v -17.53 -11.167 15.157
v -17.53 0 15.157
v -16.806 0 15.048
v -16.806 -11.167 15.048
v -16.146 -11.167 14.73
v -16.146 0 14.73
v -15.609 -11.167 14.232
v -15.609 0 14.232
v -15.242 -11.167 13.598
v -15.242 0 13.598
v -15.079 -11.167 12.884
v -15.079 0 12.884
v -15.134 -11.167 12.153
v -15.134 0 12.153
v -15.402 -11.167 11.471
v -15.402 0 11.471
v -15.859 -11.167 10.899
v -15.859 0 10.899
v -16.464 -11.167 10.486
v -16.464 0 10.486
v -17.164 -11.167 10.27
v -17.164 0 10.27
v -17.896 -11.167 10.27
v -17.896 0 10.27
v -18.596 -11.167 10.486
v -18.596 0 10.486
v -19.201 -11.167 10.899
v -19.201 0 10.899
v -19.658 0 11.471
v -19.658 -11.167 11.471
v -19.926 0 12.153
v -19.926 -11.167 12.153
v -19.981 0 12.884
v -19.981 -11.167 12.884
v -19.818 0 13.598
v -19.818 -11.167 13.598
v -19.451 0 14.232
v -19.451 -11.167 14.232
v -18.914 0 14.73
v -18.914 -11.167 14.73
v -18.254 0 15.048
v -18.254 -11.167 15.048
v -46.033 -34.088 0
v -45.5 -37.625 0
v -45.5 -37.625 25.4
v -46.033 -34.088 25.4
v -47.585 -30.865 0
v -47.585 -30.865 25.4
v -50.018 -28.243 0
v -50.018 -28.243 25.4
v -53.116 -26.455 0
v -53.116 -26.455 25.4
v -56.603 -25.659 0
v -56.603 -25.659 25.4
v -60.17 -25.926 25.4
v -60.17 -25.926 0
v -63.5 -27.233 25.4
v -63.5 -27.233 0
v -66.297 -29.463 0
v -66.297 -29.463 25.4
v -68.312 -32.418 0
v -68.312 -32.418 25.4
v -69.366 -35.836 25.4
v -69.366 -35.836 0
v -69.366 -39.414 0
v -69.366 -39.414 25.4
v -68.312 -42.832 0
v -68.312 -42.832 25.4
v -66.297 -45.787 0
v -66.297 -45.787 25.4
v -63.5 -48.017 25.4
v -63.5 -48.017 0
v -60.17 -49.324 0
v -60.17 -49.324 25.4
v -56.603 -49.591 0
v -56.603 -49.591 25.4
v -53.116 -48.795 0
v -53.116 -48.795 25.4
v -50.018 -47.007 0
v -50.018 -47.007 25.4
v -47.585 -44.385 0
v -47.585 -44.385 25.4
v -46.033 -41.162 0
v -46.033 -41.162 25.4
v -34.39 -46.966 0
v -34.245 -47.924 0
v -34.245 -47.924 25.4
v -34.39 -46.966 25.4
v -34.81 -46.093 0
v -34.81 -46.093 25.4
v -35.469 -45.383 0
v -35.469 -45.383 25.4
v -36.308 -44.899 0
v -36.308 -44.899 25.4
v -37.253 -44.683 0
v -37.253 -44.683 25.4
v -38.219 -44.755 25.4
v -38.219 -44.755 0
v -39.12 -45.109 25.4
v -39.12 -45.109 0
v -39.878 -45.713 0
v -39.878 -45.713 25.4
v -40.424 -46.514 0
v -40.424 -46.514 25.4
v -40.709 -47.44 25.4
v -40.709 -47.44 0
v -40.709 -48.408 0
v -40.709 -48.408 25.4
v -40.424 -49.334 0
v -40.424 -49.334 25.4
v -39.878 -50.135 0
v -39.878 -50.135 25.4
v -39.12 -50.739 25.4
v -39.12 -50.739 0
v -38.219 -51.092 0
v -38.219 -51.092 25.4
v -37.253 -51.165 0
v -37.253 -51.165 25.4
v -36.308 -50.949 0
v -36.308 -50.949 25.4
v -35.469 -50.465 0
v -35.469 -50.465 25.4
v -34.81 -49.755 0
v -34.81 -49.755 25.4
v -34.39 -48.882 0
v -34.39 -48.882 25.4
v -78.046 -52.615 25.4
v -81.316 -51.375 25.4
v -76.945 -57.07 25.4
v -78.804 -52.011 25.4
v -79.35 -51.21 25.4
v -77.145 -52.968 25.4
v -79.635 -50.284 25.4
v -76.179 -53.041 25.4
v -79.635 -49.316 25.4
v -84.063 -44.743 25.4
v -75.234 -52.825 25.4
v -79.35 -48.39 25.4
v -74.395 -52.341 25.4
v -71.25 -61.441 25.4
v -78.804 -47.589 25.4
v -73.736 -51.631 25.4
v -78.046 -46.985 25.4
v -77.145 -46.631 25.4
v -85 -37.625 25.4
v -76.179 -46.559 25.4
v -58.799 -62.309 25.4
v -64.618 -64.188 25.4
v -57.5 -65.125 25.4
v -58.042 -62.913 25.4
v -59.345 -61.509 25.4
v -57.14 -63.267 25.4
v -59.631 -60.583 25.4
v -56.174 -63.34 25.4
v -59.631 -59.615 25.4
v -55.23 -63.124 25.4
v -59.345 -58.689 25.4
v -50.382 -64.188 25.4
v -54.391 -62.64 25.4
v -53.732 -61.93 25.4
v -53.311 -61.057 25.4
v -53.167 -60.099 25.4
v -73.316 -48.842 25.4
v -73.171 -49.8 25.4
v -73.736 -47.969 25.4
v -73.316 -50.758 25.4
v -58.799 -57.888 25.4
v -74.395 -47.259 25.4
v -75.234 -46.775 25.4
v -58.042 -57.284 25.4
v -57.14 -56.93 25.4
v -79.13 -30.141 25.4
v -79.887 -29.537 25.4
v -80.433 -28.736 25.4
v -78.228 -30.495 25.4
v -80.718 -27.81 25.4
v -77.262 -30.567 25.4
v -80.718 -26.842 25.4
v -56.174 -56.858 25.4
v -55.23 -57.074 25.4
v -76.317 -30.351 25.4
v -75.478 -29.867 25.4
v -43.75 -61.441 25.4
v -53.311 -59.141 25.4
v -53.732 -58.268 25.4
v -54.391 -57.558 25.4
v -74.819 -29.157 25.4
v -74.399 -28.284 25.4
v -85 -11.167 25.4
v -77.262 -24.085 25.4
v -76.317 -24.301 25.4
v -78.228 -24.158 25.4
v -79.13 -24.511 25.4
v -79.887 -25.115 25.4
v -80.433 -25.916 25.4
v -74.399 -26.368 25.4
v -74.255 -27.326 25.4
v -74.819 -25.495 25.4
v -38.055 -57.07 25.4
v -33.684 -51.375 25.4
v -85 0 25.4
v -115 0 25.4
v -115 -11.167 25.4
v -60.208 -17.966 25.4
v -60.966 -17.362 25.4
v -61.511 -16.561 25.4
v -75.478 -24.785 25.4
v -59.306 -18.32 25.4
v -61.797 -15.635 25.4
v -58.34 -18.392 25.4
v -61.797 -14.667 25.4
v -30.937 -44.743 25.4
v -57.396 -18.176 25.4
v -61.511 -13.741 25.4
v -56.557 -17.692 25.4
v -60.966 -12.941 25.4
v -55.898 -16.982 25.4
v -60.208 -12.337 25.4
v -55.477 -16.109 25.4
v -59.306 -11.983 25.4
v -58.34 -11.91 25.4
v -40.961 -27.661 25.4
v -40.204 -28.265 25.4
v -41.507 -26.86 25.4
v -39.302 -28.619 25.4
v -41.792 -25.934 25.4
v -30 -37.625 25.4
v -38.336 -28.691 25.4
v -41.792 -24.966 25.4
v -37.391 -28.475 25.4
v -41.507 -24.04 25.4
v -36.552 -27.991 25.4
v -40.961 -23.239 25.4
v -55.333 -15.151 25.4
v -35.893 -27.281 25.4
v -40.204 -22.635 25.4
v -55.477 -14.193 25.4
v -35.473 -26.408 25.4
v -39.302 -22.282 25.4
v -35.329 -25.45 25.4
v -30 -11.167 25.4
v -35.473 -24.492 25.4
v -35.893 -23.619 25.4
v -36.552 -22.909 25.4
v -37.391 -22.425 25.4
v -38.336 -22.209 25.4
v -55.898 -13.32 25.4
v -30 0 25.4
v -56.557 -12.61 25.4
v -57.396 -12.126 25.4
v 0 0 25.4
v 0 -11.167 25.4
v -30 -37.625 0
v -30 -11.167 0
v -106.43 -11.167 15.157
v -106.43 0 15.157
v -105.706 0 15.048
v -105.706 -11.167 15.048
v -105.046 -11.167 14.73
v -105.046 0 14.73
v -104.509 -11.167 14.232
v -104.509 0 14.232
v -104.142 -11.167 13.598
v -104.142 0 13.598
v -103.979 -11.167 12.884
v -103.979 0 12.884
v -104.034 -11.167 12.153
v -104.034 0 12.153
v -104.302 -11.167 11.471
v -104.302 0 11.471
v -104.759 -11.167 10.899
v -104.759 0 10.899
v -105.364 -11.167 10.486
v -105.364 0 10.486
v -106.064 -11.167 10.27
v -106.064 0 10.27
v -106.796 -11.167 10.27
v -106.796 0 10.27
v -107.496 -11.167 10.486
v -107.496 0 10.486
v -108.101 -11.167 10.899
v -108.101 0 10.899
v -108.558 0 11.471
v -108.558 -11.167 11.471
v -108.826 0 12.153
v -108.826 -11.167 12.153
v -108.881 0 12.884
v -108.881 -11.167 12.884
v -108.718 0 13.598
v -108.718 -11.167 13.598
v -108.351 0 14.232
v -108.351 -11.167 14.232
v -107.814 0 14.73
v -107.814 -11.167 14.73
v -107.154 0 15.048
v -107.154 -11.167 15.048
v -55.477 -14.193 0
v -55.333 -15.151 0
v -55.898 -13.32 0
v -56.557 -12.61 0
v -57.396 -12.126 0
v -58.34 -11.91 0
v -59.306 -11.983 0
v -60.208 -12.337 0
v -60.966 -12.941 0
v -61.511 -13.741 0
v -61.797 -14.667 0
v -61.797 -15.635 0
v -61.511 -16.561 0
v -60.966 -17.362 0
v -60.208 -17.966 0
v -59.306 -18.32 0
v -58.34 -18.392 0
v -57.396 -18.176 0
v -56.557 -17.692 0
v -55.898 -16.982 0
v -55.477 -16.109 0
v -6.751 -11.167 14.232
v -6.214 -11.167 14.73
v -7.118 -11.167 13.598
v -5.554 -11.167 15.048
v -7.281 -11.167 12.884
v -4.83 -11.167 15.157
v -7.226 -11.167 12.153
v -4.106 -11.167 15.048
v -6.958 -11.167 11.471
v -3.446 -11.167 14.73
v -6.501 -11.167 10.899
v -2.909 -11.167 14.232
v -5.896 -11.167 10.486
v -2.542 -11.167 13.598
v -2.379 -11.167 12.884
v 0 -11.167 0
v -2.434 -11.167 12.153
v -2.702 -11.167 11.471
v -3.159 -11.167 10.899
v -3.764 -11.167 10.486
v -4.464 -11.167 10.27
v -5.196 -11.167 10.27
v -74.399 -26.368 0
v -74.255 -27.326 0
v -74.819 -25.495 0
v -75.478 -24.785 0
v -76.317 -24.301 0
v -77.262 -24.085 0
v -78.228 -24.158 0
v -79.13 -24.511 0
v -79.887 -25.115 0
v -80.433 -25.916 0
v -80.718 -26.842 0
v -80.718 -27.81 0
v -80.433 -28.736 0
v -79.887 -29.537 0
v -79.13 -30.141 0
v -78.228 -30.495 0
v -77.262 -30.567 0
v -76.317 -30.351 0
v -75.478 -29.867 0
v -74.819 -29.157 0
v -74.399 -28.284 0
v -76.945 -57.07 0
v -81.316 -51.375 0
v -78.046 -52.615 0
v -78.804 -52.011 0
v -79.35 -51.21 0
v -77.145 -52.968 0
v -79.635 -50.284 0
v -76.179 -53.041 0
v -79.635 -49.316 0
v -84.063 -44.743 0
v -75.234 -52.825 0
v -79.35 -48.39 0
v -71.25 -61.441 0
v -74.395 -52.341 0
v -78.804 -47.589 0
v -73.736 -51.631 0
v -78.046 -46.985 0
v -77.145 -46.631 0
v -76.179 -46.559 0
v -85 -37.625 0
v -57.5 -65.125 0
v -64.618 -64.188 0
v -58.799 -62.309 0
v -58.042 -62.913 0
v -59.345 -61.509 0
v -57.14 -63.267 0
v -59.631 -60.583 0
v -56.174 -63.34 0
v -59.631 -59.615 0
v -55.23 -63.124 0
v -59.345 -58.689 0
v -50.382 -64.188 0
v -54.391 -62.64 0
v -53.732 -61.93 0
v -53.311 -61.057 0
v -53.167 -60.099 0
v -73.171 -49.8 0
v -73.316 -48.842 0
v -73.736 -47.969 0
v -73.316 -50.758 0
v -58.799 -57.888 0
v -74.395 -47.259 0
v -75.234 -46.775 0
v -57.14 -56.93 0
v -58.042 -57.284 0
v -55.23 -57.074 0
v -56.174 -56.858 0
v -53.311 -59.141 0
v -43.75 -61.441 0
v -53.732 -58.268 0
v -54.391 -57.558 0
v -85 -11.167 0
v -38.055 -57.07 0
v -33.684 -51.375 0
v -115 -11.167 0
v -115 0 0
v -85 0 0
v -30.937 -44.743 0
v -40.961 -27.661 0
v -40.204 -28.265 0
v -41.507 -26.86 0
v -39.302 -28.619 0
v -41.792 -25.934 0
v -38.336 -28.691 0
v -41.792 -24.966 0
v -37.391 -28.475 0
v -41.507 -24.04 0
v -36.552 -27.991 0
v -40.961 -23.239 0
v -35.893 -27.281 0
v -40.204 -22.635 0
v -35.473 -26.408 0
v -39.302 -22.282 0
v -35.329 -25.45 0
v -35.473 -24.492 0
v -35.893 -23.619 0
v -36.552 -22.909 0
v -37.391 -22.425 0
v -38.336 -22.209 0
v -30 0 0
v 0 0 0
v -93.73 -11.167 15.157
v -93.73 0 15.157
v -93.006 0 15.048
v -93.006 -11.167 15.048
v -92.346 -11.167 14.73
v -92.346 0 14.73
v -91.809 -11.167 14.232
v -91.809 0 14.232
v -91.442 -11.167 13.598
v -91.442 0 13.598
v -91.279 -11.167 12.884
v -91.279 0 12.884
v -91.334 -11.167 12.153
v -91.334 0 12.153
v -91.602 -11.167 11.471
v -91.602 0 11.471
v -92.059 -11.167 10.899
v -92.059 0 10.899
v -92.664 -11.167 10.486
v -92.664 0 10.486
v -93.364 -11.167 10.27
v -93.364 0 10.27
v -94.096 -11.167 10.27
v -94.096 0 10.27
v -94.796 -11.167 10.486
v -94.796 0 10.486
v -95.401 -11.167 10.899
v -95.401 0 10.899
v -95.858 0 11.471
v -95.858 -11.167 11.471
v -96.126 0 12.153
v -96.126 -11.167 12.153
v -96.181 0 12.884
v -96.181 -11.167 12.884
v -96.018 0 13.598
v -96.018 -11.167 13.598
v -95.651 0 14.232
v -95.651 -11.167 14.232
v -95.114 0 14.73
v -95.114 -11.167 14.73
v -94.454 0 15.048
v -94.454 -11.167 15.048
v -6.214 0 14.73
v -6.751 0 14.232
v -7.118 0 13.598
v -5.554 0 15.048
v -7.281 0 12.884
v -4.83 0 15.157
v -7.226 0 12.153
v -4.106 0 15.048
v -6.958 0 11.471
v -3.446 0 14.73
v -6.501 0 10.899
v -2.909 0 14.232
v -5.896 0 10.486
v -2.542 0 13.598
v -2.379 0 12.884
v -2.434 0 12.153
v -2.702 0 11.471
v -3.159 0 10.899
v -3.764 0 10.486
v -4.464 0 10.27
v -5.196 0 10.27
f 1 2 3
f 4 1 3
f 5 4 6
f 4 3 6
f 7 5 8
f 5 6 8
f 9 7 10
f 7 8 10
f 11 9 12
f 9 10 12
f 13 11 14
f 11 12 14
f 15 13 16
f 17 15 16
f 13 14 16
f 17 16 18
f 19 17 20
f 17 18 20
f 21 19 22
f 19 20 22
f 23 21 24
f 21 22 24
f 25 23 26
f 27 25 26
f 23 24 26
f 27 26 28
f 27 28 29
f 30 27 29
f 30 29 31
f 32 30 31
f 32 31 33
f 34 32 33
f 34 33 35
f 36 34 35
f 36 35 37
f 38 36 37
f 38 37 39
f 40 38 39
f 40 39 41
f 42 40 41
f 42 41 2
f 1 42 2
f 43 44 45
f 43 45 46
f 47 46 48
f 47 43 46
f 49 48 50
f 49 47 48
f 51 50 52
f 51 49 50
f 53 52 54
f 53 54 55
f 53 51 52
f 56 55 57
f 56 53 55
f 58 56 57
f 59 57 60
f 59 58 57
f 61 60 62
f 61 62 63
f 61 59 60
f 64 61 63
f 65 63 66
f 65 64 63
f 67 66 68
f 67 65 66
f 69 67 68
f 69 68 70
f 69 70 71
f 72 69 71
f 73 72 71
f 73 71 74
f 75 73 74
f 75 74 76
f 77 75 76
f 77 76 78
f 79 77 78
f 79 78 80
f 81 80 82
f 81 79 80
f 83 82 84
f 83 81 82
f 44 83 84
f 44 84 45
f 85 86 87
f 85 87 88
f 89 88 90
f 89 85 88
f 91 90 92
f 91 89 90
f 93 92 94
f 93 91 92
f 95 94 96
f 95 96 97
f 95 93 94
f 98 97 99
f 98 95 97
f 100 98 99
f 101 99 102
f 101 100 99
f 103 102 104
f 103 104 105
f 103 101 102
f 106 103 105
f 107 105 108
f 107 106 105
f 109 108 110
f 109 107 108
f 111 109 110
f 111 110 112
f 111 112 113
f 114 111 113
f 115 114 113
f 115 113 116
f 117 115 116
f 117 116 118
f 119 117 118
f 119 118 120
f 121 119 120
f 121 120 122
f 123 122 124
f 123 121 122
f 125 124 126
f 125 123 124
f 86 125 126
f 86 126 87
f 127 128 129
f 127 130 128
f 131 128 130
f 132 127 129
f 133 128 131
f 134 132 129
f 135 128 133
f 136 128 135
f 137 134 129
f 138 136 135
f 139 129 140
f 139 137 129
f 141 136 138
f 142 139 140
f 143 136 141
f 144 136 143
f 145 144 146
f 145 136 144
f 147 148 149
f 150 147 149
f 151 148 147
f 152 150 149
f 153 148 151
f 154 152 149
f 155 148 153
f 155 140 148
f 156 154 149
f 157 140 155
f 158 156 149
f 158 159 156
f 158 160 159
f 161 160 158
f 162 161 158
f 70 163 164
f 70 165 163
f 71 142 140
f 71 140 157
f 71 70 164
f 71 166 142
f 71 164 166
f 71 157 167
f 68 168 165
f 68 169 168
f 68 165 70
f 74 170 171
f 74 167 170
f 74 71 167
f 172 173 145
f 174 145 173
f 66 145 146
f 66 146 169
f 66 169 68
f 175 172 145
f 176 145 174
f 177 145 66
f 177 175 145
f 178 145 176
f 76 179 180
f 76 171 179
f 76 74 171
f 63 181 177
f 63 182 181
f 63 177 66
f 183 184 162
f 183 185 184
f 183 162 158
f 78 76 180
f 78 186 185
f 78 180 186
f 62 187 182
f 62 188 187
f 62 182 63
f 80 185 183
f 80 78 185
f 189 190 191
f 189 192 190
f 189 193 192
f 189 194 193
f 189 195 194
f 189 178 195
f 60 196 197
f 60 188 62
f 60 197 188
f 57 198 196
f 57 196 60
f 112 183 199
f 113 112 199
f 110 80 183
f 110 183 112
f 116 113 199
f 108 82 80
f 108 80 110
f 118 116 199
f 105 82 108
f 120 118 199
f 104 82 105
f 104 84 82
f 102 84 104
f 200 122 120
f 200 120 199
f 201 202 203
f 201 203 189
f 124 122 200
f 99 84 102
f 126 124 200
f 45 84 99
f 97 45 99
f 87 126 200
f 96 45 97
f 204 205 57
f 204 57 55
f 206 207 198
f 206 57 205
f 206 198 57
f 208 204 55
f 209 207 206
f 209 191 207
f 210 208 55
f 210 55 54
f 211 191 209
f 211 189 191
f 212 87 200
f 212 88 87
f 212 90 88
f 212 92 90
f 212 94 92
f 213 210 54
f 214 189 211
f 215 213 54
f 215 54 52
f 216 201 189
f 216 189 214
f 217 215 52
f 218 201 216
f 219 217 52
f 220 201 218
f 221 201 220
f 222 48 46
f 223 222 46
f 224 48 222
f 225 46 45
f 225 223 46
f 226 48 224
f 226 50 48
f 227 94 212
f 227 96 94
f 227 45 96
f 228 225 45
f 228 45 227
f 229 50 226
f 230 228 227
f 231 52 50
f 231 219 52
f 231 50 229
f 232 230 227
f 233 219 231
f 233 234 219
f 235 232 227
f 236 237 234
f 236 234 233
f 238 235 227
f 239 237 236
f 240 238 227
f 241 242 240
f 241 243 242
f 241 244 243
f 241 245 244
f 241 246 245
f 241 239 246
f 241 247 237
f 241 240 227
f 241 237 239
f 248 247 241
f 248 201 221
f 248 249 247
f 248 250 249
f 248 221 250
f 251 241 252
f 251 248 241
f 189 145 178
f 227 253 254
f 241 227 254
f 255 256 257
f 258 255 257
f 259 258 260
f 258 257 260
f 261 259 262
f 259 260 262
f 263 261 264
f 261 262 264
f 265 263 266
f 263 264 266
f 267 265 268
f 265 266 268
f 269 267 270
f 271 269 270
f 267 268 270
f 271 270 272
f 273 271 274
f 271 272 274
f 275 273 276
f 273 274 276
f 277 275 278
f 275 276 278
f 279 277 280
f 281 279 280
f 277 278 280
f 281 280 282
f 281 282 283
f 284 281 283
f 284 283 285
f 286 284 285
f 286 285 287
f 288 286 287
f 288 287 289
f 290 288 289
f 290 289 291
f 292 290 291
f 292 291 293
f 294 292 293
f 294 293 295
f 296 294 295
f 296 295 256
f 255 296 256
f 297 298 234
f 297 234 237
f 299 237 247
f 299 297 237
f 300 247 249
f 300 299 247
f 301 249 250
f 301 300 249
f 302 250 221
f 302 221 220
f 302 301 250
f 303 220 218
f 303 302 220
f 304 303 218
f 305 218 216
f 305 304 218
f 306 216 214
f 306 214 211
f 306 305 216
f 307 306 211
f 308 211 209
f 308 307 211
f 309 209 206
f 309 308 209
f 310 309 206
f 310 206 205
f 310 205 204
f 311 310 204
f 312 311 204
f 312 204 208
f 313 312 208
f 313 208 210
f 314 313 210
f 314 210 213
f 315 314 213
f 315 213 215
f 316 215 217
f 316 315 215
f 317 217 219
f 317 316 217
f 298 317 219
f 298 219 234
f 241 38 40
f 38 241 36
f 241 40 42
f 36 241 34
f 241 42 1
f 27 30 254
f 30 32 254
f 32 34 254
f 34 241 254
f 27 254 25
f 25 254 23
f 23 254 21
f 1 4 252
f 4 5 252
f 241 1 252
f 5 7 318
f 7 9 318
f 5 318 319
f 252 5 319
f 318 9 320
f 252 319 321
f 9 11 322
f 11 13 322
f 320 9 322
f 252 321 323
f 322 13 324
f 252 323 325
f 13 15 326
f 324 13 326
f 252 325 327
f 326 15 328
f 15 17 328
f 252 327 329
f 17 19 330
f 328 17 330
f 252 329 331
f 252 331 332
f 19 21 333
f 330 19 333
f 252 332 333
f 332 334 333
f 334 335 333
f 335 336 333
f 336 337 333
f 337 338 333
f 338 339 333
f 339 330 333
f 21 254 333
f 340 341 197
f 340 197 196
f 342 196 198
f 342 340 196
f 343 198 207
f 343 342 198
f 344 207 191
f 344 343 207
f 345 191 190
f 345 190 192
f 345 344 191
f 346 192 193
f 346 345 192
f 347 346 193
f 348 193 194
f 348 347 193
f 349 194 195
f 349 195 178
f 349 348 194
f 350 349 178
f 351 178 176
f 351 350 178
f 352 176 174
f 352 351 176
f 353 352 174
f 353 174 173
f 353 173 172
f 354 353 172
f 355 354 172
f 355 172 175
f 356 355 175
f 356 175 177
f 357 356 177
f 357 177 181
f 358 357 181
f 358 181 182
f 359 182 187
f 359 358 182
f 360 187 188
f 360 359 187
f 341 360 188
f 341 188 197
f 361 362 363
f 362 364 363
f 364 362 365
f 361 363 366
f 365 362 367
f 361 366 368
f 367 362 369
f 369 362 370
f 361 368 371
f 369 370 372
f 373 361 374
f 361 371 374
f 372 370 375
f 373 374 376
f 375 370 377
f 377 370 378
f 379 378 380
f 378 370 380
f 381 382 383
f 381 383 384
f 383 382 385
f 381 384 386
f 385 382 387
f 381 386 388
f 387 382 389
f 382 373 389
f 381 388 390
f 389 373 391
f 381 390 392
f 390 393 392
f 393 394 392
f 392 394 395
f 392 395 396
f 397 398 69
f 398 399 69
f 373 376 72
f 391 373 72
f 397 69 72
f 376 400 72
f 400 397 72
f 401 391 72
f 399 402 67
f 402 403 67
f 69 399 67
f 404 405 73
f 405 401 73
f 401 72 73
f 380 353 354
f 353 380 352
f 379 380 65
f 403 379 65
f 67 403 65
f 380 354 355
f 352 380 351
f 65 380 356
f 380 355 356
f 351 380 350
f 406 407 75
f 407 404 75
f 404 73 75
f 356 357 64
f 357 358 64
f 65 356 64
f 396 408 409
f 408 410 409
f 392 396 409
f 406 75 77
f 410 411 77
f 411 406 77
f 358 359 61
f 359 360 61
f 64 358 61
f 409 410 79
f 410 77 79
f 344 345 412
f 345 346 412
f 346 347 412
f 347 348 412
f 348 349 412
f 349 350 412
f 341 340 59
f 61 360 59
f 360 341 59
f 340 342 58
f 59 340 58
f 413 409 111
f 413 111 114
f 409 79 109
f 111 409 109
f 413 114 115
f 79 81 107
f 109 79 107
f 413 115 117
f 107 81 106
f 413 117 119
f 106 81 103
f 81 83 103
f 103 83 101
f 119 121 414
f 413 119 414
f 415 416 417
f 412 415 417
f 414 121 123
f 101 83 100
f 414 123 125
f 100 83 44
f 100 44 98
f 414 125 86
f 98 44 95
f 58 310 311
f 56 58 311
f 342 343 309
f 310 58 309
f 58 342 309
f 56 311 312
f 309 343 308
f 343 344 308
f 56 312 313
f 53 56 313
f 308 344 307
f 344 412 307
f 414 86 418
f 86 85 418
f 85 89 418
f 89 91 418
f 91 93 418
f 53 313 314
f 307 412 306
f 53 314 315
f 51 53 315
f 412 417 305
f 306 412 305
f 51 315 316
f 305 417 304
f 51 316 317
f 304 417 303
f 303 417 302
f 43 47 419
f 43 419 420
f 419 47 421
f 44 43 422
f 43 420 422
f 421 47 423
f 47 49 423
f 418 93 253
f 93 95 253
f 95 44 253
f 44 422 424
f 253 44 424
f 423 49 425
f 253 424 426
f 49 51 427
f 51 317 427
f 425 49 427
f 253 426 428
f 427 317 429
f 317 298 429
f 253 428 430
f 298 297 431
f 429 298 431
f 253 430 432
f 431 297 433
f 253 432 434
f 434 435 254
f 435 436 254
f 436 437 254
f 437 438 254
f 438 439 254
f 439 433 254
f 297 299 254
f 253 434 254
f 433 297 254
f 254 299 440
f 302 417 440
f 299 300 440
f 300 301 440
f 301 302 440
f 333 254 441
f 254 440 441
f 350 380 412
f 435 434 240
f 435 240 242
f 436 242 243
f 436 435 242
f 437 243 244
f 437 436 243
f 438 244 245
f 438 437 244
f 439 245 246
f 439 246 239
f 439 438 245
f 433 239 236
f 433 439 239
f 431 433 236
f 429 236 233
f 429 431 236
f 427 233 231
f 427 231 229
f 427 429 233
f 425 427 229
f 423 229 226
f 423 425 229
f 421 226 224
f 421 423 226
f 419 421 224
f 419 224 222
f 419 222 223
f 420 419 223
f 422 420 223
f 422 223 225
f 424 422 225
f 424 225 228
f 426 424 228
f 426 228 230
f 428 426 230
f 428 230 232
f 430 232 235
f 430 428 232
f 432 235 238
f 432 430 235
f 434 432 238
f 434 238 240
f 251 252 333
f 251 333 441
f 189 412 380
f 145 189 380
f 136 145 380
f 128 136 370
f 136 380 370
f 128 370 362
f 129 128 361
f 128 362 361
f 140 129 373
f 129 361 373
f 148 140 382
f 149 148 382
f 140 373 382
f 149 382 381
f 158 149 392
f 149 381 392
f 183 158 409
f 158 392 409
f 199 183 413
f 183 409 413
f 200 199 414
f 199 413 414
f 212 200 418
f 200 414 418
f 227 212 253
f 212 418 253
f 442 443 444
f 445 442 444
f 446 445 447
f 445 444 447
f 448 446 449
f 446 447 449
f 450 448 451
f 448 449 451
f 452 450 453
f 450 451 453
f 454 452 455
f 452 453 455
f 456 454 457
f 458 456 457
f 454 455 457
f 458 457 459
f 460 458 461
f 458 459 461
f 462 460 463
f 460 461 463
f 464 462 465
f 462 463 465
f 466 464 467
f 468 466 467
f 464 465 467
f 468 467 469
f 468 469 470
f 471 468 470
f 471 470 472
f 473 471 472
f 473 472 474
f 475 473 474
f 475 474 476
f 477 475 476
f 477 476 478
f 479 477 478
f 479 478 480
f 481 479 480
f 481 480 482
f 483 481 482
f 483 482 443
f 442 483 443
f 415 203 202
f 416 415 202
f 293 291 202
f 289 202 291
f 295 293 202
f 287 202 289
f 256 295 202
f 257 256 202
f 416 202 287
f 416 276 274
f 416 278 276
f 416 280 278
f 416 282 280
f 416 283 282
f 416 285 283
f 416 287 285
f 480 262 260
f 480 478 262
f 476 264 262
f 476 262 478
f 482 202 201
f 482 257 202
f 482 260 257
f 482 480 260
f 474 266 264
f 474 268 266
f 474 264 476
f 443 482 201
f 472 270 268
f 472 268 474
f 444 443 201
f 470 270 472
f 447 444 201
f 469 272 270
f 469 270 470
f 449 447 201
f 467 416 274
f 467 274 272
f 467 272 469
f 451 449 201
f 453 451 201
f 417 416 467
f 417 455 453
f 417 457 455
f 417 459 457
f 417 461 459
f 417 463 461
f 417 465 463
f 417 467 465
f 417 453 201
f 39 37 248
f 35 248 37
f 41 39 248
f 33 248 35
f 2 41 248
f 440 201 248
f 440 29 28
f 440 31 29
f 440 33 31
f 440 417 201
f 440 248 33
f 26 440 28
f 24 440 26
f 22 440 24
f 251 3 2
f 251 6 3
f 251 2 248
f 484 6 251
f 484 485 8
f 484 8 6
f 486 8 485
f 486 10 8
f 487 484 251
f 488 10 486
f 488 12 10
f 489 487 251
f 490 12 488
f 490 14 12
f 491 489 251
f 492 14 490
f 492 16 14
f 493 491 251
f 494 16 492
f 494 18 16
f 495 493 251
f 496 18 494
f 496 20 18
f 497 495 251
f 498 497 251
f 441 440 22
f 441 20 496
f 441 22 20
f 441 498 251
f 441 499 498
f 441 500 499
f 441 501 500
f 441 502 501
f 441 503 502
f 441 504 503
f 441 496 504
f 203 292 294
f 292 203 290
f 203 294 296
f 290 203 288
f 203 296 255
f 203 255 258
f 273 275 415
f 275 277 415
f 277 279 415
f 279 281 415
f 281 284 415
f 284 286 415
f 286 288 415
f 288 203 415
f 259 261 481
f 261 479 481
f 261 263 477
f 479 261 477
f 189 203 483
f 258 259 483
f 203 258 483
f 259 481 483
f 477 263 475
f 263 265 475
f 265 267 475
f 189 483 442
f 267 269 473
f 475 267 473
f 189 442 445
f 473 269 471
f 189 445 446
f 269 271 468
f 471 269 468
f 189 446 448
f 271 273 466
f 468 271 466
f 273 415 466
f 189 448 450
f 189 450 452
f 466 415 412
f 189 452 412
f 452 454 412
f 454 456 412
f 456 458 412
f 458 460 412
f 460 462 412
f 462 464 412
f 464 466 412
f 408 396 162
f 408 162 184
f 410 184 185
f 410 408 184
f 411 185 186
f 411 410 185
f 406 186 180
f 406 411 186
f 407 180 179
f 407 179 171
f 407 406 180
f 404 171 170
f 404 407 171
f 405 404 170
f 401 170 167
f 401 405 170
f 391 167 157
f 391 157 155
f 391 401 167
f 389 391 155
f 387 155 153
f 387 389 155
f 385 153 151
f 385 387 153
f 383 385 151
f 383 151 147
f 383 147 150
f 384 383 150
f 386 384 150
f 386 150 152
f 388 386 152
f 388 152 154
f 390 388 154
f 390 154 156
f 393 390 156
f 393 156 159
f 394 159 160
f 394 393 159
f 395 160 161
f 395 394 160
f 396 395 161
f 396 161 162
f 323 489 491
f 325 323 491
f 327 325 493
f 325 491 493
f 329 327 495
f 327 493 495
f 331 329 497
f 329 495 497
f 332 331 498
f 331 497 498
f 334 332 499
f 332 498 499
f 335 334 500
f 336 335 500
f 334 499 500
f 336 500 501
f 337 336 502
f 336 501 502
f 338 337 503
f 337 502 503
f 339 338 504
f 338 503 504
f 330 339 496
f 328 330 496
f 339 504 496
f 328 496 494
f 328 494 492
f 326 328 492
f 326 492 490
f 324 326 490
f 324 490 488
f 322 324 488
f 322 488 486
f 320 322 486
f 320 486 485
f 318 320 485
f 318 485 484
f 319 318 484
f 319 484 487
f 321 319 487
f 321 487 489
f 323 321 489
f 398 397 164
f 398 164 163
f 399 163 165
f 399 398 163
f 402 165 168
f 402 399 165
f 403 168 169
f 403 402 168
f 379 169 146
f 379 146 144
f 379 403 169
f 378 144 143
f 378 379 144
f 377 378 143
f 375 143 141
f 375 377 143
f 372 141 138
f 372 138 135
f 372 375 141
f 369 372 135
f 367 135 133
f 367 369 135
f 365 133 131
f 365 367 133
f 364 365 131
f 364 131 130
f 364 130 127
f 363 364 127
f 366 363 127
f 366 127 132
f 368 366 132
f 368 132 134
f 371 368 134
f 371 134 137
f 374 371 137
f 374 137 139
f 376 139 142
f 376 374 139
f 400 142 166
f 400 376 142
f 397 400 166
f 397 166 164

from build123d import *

# Parameters (mm, degrees)
SKETCH1_W           = 30
SKETCH1_H           = 11.167486893
SKETCH1_R           = 27.5
SKETCH1_R_2         = 3.25
SKETCH1_R_3         = 12
BOSS_EXTRUDE1_DEPTH = 25.4
SKETCH2_R           = 2.45745
CUT_EXTRUDE1_DEPTH  = 31


with BuildPart() as part:
    # Sketch1 → Boss-Extrude1 (new body)
    # profile 1 of 4: a face of its own
    with BuildSketch(Plane.XY):
        with Locations((-100, -5.583743447)):
            Rectangle(SKETCH1_W, SKETCH1_H)
    # profile 2 of 4: a face of its own
    with BuildSketch(Plane.XY):
        with BuildLine():
            Line((-85, -11.167486893), (-85, -37.625000004))
            ThreePointArc((-85, -37.625000004), (-57.5, -10.125000004), (-30, -37.625000004))
            Line((-30, -37.625000004), (-30, -11.167486893))
            Line((-30, -11.167486893), (-30, 0))
            Line((-30, 0), (-85, 0))
            Line((-85, 0), (-85, -11.167486893))
        make_face()
    # profile 3 of 4: a face of its own
    with BuildSketch(Plane.XY):
        with Locations((-57.5, -37.625000004)):
            Circle(SKETCH1_R)
        with Locations((-58.583096057, -15.151083947)):
            Circle(SKETCH1_R_2, mode=Mode.SUBTRACT)
        with Locations((-38.578565801, -25.450053276)):
            Circle(SKETCH1_R_2, mode=Mode.SUBTRACT)
        with Locations((-37.495469744, -47.923969333)):
            Circle(SKETCH1_R_2, mode=Mode.SUBTRACT)
        with Locations((-56.416903943, -60.098916061)):
            Circle(SKETCH1_R_2, mode=Mode.SUBTRACT)
        with Locations((-76.421434199, -49.799946732)):
            Circle(SKETCH1_R_2, mode=Mode.SUBTRACT)
        with Locations((-77.504530256, -27.326030675)):
            Circle(SKETCH1_R_2, mode=Mode.SUBTRACT)
        with Locations((-57.5, -37.625000004)):
            Circle(SKETCH1_R_3, mode=Mode.SUBTRACT)
    # profile 4 of 4: a face of its own
    with BuildSketch(Plane.XY):
        with Locations((-15, -5.583743447)):
            Rectangle(SKETCH1_W, SKETCH1_H)
    extrude(amount=BOSS_EXTRUDE1_DEPTH)

    # Sketch2 → Cut-Extrude1 (cut)
    with BuildSketch(Plane(origin=(0, 0, 0), x_dir=(1, 0, 0), z_dir=(0, 1, 0))):
        with Locations(Location((-93.73, -12.7, 0), (0, 0, 270))):
            Circle(SKETCH2_R)
        with Locations(Location((-106.43, -12.7, 0), (0, 0, 270))):
            Circle(SKETCH2_R)
        with Locations(Location((-17.53, -12.7, 0), (0, 0, 270))):
            Circle(SKETCH2_R)
        with Locations(Location((-4.83, -12.7, 0), (0, 0, 270))):
            Circle(SKETCH2_R)
    extrude(amount=-CUT_EXTRUDE1_DEPTH, mode=Mode.SUBTRACT)


solid = part.part
